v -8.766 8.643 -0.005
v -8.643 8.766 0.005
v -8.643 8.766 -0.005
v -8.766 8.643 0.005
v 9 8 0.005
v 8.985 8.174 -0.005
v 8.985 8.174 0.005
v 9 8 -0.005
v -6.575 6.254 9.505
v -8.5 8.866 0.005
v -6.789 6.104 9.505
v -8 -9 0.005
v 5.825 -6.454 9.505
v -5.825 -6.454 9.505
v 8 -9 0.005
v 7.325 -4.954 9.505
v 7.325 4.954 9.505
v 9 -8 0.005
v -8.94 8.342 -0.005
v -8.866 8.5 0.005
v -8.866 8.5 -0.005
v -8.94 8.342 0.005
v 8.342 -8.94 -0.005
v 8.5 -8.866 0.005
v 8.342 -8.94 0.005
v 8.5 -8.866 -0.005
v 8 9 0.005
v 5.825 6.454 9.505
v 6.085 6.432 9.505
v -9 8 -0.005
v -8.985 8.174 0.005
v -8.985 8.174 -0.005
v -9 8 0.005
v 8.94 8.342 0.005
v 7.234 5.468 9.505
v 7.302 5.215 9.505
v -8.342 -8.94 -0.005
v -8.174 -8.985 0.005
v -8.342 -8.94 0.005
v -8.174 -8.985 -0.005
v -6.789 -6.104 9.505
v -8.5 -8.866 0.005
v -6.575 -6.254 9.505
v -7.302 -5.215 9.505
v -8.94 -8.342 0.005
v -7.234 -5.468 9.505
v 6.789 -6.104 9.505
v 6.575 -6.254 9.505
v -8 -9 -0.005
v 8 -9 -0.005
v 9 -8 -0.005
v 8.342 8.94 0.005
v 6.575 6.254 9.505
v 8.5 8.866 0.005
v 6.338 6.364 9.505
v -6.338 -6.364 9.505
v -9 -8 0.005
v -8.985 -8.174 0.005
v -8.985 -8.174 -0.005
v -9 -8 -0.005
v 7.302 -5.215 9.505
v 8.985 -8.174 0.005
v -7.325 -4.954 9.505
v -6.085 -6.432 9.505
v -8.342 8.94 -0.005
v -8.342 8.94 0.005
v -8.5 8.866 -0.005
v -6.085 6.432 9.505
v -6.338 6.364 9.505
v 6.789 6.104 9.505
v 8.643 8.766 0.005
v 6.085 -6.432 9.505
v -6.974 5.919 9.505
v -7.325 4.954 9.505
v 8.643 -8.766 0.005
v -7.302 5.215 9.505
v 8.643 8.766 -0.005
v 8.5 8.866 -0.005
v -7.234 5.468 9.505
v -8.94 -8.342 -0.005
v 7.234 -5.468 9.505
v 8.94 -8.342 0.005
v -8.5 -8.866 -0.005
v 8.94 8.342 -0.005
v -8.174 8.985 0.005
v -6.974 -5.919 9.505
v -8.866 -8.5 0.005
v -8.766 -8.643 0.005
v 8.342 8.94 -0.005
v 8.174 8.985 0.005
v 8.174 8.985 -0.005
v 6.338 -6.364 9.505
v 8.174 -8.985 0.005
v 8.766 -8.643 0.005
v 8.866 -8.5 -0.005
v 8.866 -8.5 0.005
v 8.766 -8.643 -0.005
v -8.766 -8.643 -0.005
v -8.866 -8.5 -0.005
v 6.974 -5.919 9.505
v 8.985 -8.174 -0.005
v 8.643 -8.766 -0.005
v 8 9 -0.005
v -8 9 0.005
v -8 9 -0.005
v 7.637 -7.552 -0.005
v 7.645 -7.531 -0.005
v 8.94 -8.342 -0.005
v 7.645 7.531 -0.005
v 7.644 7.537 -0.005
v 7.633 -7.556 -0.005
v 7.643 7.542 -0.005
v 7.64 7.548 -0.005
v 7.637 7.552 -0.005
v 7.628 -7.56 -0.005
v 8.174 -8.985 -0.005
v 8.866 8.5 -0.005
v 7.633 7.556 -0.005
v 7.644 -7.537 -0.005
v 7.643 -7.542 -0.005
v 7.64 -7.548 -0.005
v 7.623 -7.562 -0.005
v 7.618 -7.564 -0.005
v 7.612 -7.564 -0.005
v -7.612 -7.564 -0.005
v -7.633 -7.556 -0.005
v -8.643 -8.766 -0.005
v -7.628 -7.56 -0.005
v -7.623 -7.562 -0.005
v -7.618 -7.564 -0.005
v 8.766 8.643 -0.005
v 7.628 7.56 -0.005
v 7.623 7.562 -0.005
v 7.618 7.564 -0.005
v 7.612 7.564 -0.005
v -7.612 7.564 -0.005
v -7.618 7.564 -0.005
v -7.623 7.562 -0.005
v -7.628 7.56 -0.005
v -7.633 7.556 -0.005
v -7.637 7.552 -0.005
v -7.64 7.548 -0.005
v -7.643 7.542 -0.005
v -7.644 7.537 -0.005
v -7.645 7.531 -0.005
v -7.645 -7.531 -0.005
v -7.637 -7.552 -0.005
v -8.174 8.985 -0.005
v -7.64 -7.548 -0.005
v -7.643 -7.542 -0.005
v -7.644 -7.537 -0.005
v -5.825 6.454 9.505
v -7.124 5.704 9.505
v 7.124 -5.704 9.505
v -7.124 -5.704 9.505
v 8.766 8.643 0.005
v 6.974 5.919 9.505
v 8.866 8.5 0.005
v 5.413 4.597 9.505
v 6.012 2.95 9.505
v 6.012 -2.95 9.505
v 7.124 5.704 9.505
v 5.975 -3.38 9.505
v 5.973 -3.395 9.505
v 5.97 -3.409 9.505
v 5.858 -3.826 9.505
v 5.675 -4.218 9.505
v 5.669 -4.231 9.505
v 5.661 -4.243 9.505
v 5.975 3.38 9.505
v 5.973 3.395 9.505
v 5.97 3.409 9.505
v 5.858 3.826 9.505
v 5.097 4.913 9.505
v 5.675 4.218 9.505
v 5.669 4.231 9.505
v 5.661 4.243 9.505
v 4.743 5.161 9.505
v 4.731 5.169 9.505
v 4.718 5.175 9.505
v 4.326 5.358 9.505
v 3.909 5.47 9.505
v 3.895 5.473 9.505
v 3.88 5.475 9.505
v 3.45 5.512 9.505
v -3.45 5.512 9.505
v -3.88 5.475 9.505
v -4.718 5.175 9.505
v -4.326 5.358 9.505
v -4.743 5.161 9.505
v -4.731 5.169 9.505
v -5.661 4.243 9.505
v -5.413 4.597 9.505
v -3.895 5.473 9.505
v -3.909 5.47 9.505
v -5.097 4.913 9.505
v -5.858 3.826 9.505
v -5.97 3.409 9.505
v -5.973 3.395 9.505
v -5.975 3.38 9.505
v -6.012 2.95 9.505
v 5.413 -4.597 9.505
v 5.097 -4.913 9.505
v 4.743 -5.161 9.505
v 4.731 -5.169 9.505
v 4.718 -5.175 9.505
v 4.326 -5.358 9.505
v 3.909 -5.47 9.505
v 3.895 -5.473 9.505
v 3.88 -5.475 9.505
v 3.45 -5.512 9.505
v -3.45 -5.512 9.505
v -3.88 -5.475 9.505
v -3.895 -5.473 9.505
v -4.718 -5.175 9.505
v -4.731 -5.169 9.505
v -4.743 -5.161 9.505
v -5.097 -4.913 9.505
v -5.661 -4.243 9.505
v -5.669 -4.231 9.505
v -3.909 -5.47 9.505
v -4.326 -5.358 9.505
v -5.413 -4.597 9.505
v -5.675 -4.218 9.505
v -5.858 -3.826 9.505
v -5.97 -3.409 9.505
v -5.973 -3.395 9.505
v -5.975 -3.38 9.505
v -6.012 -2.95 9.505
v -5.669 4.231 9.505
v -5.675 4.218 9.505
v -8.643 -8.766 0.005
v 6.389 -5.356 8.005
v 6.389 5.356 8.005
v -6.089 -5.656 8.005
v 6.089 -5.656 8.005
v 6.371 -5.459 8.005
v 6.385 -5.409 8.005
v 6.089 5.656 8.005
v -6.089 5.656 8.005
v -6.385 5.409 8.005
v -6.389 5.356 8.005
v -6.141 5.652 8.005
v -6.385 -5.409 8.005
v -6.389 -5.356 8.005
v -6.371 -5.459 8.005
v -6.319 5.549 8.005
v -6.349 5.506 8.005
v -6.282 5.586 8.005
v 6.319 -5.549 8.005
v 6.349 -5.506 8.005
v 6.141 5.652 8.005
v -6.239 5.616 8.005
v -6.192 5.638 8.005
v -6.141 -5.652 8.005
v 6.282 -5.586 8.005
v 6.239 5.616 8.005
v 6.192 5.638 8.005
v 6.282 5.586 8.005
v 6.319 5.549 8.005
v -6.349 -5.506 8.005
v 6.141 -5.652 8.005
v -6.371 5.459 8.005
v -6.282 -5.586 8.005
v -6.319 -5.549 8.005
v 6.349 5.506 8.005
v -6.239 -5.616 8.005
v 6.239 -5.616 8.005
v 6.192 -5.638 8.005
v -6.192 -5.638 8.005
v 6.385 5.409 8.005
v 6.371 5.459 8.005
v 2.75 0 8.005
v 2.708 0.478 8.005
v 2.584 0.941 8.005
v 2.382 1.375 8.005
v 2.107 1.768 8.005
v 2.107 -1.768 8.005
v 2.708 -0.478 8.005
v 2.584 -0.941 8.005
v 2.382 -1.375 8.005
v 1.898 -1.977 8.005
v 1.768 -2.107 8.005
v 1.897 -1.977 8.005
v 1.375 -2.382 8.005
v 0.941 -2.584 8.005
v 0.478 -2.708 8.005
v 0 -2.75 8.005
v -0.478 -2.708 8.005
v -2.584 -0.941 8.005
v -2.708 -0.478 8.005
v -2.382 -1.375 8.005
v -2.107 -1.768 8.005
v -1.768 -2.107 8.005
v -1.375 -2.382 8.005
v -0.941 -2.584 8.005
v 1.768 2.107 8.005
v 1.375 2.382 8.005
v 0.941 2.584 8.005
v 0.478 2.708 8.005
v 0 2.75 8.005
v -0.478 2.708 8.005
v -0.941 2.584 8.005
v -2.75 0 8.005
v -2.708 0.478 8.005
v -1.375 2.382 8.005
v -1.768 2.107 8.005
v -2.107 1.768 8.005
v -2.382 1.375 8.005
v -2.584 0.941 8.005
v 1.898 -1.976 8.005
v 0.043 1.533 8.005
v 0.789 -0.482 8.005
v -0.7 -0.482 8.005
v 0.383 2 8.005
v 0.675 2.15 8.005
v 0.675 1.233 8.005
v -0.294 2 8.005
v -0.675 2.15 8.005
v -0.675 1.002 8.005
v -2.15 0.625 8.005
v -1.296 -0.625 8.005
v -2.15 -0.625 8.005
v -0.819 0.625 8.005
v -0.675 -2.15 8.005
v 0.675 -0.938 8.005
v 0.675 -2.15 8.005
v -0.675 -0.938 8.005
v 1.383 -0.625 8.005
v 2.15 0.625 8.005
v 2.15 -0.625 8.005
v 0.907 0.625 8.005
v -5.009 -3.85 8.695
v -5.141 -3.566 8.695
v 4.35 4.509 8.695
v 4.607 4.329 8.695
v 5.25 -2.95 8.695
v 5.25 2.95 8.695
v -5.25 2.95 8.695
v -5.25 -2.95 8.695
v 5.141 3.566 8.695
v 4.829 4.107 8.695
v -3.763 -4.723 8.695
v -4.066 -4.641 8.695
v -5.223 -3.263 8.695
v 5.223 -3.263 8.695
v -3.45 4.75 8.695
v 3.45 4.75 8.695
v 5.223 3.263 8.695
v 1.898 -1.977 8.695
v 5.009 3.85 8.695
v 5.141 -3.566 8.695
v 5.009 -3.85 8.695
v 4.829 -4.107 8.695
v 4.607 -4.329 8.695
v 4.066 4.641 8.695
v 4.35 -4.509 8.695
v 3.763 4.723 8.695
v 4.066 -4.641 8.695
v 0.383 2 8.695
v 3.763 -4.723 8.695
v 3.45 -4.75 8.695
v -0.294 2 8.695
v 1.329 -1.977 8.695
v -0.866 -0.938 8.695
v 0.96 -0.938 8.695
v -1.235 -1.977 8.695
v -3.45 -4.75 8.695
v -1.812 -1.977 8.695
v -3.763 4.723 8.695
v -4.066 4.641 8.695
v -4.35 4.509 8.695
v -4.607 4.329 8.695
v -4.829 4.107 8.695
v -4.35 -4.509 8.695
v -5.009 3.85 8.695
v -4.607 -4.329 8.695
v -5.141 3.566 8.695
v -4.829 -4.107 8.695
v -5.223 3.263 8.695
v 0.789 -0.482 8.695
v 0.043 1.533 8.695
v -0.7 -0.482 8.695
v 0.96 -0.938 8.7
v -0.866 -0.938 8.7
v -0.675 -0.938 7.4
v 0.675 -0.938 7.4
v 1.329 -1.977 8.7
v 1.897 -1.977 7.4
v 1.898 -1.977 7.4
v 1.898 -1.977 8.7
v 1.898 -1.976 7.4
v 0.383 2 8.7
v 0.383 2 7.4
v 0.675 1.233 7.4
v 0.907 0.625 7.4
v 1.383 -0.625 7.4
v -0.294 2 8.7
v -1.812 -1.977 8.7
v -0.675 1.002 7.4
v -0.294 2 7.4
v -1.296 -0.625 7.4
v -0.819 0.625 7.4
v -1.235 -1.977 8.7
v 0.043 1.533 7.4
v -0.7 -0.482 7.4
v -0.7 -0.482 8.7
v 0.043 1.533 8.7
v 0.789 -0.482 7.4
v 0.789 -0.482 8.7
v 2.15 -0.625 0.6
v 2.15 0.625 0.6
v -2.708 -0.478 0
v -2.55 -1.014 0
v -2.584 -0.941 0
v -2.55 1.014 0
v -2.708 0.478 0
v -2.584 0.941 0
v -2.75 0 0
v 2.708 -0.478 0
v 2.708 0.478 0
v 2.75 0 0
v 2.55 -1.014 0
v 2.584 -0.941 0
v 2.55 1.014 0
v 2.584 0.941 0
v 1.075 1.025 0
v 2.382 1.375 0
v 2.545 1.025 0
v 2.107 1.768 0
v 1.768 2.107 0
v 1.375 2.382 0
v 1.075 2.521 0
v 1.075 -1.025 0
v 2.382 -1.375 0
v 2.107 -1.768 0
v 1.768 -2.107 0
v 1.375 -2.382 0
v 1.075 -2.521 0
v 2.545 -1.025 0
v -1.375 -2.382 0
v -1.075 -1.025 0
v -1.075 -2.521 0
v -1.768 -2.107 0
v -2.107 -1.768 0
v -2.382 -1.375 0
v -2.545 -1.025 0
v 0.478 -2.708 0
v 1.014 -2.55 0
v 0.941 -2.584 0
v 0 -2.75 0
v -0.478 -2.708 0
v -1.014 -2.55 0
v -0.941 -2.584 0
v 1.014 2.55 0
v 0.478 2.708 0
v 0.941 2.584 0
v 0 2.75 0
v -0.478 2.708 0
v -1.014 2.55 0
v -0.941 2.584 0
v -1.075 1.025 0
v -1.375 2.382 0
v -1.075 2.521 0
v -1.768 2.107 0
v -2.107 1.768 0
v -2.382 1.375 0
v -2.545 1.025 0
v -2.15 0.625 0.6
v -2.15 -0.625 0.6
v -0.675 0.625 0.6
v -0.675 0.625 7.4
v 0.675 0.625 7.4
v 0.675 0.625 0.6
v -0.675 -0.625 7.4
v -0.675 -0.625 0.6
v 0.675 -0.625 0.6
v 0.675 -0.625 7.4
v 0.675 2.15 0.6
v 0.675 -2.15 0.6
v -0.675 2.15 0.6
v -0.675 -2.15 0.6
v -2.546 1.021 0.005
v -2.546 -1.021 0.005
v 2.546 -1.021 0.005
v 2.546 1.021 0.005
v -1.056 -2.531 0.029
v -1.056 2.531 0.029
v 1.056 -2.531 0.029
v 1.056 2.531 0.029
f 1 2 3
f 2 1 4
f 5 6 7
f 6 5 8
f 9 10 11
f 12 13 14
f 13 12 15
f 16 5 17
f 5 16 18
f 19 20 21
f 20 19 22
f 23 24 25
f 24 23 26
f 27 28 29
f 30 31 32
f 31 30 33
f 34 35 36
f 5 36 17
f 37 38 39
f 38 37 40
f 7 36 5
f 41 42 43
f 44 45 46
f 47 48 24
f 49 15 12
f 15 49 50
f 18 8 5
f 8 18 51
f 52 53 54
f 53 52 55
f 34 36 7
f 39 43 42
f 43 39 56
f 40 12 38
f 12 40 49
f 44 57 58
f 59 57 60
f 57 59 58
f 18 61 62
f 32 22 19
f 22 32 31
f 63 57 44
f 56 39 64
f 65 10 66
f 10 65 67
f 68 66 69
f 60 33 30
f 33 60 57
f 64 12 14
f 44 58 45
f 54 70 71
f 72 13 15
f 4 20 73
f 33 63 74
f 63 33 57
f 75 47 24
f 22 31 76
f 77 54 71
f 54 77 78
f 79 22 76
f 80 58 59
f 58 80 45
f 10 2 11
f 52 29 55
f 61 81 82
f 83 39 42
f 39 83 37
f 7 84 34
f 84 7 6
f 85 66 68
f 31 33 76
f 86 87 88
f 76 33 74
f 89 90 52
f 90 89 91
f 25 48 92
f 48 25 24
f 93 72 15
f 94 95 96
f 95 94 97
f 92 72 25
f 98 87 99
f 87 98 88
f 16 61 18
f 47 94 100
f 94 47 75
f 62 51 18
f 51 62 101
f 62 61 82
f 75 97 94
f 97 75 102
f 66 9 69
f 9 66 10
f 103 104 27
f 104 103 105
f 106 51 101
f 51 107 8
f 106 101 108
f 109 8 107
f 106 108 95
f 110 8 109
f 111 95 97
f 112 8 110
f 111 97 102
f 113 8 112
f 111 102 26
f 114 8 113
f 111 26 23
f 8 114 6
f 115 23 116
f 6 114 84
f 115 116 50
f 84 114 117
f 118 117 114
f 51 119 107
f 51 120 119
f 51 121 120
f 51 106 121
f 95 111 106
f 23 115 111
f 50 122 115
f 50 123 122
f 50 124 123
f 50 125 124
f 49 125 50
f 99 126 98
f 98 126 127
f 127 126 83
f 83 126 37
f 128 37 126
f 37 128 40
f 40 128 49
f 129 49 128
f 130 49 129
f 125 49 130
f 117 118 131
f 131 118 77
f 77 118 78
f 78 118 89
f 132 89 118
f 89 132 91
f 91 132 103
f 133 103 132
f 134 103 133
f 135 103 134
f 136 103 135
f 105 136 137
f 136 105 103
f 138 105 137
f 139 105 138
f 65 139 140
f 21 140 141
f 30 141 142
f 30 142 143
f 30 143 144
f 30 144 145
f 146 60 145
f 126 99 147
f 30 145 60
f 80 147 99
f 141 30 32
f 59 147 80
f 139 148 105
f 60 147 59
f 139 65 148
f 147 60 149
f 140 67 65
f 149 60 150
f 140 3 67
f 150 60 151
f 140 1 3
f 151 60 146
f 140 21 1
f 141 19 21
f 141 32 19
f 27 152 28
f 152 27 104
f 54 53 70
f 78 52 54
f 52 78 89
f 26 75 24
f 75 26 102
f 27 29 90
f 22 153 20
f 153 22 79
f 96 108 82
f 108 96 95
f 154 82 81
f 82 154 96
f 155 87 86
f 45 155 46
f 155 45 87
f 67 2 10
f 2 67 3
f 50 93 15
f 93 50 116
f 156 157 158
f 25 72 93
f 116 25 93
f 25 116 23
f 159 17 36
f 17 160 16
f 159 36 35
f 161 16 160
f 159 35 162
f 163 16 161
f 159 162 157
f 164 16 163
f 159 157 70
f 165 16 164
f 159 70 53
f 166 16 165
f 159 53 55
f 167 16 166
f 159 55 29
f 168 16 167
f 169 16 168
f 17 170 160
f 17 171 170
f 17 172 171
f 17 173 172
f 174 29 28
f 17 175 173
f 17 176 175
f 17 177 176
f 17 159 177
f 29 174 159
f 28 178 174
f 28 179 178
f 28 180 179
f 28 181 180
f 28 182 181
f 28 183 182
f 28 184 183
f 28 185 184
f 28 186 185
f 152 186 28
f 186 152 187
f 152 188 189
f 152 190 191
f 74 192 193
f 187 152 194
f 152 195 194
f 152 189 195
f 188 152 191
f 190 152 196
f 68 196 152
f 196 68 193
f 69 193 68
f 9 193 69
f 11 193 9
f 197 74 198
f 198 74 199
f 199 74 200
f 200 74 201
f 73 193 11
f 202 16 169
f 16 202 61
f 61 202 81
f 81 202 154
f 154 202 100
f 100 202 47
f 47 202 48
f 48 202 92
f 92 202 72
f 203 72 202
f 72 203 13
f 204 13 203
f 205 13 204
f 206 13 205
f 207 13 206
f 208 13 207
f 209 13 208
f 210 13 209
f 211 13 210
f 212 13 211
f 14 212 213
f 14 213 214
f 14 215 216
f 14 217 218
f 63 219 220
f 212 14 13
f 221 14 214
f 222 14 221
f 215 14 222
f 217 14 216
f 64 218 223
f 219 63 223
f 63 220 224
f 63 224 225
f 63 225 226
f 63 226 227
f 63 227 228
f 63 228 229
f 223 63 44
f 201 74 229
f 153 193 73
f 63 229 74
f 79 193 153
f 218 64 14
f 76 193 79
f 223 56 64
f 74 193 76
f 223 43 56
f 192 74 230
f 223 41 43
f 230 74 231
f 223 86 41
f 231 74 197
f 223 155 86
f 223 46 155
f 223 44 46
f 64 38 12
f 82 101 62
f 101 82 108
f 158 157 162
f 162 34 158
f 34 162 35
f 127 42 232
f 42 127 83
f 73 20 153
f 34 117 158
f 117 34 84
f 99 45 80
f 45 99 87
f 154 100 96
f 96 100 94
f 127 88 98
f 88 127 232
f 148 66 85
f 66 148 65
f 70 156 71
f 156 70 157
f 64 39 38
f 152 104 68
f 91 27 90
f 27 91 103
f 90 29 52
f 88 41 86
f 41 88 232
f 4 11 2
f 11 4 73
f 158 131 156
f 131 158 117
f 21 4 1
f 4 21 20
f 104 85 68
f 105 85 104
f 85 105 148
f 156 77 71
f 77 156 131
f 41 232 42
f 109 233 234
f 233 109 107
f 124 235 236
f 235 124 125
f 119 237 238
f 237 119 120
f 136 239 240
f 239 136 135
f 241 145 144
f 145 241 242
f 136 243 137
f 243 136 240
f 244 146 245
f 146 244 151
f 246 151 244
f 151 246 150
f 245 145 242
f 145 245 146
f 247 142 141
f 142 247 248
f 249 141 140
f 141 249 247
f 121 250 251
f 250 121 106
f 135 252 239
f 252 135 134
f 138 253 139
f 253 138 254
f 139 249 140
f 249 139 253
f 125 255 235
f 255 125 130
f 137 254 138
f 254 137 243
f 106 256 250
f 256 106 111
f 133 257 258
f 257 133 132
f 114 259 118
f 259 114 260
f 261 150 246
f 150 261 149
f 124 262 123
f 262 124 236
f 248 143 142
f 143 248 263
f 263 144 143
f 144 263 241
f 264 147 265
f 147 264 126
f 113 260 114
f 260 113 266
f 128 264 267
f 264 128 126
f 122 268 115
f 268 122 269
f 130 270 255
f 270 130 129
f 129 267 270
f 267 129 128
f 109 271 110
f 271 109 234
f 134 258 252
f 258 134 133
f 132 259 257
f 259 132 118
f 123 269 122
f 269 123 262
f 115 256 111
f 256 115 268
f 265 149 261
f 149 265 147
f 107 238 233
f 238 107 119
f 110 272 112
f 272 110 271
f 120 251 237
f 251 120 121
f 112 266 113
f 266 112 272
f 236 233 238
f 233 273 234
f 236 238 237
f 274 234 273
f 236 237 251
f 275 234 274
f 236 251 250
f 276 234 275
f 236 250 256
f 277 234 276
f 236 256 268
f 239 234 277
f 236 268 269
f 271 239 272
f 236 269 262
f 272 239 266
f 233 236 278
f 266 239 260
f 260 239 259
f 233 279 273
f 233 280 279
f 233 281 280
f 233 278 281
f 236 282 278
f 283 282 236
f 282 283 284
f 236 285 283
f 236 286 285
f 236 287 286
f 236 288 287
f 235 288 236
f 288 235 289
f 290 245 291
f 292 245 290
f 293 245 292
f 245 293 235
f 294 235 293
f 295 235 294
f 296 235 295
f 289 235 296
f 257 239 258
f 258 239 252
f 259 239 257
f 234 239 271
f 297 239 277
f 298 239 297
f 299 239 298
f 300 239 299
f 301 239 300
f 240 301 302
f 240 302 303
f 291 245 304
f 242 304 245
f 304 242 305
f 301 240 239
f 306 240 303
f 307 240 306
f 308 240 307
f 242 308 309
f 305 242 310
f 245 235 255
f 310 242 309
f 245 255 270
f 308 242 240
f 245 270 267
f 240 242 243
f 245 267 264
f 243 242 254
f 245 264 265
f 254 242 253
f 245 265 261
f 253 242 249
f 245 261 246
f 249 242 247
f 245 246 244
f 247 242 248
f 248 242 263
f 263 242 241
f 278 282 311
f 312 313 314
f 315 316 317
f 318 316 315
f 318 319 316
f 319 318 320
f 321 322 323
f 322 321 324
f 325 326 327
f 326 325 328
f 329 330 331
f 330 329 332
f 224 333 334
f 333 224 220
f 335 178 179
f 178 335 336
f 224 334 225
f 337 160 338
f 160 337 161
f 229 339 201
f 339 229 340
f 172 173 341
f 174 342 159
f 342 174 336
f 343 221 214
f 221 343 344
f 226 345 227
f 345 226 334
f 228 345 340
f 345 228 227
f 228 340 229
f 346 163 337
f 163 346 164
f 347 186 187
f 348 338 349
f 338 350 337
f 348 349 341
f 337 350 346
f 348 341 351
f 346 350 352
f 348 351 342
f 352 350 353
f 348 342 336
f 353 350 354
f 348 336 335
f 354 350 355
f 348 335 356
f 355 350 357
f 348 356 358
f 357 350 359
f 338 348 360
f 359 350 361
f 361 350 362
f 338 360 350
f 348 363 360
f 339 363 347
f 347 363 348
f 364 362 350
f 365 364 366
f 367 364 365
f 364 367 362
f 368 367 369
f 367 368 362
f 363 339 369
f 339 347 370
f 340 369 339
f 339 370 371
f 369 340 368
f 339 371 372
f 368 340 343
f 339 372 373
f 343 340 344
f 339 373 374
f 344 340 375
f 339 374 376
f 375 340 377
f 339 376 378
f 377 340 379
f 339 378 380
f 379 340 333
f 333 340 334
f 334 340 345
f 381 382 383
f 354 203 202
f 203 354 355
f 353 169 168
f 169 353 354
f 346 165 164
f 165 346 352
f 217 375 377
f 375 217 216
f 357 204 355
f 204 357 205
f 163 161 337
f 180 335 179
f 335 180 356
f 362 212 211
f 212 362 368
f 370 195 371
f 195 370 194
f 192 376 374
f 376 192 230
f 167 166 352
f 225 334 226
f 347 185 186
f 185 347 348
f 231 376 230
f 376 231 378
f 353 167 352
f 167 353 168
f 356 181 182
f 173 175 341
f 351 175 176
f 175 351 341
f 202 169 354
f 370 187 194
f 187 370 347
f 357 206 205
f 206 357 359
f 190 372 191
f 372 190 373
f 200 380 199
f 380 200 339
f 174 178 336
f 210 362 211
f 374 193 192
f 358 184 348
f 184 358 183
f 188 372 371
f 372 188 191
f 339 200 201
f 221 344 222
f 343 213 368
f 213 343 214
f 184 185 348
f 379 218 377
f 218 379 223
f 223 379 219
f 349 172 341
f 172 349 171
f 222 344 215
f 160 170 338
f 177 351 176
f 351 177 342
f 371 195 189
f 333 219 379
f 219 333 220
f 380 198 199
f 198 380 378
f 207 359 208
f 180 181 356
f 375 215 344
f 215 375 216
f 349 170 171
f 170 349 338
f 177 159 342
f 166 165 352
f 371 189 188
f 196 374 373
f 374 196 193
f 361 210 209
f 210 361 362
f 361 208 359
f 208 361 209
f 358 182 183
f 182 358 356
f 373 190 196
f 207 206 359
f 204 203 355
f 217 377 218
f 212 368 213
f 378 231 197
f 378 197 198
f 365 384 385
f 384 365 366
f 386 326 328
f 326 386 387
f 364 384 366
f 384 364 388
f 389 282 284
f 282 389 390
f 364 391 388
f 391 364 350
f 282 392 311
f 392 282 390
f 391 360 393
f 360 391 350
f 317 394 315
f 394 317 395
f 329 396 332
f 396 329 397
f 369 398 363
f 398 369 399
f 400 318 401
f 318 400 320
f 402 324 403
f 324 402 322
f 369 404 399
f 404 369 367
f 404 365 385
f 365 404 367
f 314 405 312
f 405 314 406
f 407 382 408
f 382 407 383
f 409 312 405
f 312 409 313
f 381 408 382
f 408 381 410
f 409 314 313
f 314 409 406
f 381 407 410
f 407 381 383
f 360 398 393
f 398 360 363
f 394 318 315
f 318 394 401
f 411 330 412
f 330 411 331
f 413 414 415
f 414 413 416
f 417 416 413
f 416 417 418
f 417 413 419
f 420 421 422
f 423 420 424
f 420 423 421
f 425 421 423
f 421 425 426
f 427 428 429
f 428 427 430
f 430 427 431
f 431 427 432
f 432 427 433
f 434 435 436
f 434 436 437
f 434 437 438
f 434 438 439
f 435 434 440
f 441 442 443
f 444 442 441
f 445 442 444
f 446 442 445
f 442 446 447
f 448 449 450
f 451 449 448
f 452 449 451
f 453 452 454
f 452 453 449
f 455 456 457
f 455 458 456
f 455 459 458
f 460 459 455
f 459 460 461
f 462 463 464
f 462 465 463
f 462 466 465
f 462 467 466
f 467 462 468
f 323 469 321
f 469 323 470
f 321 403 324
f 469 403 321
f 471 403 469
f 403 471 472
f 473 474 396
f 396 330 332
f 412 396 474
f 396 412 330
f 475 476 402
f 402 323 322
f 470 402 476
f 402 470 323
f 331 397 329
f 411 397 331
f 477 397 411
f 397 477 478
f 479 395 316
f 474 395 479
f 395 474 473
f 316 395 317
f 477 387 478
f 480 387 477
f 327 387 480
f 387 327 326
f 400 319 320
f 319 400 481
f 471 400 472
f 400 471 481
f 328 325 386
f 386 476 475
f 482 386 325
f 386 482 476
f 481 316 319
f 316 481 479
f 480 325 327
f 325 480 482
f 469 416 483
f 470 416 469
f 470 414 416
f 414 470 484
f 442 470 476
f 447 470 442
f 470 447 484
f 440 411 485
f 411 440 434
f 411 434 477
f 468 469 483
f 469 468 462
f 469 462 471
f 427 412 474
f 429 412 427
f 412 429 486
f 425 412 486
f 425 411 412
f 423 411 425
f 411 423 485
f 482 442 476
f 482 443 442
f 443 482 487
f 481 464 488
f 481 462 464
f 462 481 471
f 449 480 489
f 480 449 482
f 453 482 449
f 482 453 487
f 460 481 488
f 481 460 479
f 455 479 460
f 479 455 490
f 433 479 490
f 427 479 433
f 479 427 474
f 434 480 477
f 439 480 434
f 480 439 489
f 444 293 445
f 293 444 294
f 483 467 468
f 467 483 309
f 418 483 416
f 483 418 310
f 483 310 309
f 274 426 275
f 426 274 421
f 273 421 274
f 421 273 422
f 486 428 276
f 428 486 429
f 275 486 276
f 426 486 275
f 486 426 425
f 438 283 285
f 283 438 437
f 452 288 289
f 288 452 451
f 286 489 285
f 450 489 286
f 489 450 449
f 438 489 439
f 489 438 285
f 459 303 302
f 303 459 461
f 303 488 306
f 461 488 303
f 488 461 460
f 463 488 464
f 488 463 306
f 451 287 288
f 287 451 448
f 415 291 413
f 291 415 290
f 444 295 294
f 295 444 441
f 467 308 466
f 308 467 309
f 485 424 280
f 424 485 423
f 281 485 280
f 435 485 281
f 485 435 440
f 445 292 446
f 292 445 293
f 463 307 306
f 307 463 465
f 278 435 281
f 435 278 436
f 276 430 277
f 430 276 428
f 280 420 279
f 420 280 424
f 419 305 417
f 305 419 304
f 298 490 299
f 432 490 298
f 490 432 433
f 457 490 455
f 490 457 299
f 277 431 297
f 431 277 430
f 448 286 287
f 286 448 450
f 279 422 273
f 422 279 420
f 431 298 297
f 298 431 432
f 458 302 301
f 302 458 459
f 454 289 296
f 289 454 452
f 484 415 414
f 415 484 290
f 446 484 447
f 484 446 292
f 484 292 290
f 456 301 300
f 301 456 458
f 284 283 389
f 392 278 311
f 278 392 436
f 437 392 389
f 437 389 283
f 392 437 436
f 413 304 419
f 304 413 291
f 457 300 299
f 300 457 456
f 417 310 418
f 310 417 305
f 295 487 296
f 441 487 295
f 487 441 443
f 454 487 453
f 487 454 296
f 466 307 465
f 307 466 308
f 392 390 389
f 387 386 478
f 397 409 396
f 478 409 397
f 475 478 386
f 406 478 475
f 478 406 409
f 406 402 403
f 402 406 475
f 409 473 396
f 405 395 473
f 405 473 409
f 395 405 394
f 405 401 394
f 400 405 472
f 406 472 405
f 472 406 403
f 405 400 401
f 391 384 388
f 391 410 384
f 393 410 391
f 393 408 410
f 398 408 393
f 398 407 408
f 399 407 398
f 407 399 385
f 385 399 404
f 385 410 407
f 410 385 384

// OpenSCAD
export_target = "preview";
include <common/custom-shell-params.scad>

user_top_hat_enabled = true;
user_top_hat_top_width = 10.5;
user_top_hat_top_depth = 9.5;
user_top_hat_top_radius = 1.8;
user_top_hat_height = -0.8;
user_top_hat_shoulder_angle = 45;
user_top_hat_shoulder_radius = 0;

include <../base/keycap.scad>
